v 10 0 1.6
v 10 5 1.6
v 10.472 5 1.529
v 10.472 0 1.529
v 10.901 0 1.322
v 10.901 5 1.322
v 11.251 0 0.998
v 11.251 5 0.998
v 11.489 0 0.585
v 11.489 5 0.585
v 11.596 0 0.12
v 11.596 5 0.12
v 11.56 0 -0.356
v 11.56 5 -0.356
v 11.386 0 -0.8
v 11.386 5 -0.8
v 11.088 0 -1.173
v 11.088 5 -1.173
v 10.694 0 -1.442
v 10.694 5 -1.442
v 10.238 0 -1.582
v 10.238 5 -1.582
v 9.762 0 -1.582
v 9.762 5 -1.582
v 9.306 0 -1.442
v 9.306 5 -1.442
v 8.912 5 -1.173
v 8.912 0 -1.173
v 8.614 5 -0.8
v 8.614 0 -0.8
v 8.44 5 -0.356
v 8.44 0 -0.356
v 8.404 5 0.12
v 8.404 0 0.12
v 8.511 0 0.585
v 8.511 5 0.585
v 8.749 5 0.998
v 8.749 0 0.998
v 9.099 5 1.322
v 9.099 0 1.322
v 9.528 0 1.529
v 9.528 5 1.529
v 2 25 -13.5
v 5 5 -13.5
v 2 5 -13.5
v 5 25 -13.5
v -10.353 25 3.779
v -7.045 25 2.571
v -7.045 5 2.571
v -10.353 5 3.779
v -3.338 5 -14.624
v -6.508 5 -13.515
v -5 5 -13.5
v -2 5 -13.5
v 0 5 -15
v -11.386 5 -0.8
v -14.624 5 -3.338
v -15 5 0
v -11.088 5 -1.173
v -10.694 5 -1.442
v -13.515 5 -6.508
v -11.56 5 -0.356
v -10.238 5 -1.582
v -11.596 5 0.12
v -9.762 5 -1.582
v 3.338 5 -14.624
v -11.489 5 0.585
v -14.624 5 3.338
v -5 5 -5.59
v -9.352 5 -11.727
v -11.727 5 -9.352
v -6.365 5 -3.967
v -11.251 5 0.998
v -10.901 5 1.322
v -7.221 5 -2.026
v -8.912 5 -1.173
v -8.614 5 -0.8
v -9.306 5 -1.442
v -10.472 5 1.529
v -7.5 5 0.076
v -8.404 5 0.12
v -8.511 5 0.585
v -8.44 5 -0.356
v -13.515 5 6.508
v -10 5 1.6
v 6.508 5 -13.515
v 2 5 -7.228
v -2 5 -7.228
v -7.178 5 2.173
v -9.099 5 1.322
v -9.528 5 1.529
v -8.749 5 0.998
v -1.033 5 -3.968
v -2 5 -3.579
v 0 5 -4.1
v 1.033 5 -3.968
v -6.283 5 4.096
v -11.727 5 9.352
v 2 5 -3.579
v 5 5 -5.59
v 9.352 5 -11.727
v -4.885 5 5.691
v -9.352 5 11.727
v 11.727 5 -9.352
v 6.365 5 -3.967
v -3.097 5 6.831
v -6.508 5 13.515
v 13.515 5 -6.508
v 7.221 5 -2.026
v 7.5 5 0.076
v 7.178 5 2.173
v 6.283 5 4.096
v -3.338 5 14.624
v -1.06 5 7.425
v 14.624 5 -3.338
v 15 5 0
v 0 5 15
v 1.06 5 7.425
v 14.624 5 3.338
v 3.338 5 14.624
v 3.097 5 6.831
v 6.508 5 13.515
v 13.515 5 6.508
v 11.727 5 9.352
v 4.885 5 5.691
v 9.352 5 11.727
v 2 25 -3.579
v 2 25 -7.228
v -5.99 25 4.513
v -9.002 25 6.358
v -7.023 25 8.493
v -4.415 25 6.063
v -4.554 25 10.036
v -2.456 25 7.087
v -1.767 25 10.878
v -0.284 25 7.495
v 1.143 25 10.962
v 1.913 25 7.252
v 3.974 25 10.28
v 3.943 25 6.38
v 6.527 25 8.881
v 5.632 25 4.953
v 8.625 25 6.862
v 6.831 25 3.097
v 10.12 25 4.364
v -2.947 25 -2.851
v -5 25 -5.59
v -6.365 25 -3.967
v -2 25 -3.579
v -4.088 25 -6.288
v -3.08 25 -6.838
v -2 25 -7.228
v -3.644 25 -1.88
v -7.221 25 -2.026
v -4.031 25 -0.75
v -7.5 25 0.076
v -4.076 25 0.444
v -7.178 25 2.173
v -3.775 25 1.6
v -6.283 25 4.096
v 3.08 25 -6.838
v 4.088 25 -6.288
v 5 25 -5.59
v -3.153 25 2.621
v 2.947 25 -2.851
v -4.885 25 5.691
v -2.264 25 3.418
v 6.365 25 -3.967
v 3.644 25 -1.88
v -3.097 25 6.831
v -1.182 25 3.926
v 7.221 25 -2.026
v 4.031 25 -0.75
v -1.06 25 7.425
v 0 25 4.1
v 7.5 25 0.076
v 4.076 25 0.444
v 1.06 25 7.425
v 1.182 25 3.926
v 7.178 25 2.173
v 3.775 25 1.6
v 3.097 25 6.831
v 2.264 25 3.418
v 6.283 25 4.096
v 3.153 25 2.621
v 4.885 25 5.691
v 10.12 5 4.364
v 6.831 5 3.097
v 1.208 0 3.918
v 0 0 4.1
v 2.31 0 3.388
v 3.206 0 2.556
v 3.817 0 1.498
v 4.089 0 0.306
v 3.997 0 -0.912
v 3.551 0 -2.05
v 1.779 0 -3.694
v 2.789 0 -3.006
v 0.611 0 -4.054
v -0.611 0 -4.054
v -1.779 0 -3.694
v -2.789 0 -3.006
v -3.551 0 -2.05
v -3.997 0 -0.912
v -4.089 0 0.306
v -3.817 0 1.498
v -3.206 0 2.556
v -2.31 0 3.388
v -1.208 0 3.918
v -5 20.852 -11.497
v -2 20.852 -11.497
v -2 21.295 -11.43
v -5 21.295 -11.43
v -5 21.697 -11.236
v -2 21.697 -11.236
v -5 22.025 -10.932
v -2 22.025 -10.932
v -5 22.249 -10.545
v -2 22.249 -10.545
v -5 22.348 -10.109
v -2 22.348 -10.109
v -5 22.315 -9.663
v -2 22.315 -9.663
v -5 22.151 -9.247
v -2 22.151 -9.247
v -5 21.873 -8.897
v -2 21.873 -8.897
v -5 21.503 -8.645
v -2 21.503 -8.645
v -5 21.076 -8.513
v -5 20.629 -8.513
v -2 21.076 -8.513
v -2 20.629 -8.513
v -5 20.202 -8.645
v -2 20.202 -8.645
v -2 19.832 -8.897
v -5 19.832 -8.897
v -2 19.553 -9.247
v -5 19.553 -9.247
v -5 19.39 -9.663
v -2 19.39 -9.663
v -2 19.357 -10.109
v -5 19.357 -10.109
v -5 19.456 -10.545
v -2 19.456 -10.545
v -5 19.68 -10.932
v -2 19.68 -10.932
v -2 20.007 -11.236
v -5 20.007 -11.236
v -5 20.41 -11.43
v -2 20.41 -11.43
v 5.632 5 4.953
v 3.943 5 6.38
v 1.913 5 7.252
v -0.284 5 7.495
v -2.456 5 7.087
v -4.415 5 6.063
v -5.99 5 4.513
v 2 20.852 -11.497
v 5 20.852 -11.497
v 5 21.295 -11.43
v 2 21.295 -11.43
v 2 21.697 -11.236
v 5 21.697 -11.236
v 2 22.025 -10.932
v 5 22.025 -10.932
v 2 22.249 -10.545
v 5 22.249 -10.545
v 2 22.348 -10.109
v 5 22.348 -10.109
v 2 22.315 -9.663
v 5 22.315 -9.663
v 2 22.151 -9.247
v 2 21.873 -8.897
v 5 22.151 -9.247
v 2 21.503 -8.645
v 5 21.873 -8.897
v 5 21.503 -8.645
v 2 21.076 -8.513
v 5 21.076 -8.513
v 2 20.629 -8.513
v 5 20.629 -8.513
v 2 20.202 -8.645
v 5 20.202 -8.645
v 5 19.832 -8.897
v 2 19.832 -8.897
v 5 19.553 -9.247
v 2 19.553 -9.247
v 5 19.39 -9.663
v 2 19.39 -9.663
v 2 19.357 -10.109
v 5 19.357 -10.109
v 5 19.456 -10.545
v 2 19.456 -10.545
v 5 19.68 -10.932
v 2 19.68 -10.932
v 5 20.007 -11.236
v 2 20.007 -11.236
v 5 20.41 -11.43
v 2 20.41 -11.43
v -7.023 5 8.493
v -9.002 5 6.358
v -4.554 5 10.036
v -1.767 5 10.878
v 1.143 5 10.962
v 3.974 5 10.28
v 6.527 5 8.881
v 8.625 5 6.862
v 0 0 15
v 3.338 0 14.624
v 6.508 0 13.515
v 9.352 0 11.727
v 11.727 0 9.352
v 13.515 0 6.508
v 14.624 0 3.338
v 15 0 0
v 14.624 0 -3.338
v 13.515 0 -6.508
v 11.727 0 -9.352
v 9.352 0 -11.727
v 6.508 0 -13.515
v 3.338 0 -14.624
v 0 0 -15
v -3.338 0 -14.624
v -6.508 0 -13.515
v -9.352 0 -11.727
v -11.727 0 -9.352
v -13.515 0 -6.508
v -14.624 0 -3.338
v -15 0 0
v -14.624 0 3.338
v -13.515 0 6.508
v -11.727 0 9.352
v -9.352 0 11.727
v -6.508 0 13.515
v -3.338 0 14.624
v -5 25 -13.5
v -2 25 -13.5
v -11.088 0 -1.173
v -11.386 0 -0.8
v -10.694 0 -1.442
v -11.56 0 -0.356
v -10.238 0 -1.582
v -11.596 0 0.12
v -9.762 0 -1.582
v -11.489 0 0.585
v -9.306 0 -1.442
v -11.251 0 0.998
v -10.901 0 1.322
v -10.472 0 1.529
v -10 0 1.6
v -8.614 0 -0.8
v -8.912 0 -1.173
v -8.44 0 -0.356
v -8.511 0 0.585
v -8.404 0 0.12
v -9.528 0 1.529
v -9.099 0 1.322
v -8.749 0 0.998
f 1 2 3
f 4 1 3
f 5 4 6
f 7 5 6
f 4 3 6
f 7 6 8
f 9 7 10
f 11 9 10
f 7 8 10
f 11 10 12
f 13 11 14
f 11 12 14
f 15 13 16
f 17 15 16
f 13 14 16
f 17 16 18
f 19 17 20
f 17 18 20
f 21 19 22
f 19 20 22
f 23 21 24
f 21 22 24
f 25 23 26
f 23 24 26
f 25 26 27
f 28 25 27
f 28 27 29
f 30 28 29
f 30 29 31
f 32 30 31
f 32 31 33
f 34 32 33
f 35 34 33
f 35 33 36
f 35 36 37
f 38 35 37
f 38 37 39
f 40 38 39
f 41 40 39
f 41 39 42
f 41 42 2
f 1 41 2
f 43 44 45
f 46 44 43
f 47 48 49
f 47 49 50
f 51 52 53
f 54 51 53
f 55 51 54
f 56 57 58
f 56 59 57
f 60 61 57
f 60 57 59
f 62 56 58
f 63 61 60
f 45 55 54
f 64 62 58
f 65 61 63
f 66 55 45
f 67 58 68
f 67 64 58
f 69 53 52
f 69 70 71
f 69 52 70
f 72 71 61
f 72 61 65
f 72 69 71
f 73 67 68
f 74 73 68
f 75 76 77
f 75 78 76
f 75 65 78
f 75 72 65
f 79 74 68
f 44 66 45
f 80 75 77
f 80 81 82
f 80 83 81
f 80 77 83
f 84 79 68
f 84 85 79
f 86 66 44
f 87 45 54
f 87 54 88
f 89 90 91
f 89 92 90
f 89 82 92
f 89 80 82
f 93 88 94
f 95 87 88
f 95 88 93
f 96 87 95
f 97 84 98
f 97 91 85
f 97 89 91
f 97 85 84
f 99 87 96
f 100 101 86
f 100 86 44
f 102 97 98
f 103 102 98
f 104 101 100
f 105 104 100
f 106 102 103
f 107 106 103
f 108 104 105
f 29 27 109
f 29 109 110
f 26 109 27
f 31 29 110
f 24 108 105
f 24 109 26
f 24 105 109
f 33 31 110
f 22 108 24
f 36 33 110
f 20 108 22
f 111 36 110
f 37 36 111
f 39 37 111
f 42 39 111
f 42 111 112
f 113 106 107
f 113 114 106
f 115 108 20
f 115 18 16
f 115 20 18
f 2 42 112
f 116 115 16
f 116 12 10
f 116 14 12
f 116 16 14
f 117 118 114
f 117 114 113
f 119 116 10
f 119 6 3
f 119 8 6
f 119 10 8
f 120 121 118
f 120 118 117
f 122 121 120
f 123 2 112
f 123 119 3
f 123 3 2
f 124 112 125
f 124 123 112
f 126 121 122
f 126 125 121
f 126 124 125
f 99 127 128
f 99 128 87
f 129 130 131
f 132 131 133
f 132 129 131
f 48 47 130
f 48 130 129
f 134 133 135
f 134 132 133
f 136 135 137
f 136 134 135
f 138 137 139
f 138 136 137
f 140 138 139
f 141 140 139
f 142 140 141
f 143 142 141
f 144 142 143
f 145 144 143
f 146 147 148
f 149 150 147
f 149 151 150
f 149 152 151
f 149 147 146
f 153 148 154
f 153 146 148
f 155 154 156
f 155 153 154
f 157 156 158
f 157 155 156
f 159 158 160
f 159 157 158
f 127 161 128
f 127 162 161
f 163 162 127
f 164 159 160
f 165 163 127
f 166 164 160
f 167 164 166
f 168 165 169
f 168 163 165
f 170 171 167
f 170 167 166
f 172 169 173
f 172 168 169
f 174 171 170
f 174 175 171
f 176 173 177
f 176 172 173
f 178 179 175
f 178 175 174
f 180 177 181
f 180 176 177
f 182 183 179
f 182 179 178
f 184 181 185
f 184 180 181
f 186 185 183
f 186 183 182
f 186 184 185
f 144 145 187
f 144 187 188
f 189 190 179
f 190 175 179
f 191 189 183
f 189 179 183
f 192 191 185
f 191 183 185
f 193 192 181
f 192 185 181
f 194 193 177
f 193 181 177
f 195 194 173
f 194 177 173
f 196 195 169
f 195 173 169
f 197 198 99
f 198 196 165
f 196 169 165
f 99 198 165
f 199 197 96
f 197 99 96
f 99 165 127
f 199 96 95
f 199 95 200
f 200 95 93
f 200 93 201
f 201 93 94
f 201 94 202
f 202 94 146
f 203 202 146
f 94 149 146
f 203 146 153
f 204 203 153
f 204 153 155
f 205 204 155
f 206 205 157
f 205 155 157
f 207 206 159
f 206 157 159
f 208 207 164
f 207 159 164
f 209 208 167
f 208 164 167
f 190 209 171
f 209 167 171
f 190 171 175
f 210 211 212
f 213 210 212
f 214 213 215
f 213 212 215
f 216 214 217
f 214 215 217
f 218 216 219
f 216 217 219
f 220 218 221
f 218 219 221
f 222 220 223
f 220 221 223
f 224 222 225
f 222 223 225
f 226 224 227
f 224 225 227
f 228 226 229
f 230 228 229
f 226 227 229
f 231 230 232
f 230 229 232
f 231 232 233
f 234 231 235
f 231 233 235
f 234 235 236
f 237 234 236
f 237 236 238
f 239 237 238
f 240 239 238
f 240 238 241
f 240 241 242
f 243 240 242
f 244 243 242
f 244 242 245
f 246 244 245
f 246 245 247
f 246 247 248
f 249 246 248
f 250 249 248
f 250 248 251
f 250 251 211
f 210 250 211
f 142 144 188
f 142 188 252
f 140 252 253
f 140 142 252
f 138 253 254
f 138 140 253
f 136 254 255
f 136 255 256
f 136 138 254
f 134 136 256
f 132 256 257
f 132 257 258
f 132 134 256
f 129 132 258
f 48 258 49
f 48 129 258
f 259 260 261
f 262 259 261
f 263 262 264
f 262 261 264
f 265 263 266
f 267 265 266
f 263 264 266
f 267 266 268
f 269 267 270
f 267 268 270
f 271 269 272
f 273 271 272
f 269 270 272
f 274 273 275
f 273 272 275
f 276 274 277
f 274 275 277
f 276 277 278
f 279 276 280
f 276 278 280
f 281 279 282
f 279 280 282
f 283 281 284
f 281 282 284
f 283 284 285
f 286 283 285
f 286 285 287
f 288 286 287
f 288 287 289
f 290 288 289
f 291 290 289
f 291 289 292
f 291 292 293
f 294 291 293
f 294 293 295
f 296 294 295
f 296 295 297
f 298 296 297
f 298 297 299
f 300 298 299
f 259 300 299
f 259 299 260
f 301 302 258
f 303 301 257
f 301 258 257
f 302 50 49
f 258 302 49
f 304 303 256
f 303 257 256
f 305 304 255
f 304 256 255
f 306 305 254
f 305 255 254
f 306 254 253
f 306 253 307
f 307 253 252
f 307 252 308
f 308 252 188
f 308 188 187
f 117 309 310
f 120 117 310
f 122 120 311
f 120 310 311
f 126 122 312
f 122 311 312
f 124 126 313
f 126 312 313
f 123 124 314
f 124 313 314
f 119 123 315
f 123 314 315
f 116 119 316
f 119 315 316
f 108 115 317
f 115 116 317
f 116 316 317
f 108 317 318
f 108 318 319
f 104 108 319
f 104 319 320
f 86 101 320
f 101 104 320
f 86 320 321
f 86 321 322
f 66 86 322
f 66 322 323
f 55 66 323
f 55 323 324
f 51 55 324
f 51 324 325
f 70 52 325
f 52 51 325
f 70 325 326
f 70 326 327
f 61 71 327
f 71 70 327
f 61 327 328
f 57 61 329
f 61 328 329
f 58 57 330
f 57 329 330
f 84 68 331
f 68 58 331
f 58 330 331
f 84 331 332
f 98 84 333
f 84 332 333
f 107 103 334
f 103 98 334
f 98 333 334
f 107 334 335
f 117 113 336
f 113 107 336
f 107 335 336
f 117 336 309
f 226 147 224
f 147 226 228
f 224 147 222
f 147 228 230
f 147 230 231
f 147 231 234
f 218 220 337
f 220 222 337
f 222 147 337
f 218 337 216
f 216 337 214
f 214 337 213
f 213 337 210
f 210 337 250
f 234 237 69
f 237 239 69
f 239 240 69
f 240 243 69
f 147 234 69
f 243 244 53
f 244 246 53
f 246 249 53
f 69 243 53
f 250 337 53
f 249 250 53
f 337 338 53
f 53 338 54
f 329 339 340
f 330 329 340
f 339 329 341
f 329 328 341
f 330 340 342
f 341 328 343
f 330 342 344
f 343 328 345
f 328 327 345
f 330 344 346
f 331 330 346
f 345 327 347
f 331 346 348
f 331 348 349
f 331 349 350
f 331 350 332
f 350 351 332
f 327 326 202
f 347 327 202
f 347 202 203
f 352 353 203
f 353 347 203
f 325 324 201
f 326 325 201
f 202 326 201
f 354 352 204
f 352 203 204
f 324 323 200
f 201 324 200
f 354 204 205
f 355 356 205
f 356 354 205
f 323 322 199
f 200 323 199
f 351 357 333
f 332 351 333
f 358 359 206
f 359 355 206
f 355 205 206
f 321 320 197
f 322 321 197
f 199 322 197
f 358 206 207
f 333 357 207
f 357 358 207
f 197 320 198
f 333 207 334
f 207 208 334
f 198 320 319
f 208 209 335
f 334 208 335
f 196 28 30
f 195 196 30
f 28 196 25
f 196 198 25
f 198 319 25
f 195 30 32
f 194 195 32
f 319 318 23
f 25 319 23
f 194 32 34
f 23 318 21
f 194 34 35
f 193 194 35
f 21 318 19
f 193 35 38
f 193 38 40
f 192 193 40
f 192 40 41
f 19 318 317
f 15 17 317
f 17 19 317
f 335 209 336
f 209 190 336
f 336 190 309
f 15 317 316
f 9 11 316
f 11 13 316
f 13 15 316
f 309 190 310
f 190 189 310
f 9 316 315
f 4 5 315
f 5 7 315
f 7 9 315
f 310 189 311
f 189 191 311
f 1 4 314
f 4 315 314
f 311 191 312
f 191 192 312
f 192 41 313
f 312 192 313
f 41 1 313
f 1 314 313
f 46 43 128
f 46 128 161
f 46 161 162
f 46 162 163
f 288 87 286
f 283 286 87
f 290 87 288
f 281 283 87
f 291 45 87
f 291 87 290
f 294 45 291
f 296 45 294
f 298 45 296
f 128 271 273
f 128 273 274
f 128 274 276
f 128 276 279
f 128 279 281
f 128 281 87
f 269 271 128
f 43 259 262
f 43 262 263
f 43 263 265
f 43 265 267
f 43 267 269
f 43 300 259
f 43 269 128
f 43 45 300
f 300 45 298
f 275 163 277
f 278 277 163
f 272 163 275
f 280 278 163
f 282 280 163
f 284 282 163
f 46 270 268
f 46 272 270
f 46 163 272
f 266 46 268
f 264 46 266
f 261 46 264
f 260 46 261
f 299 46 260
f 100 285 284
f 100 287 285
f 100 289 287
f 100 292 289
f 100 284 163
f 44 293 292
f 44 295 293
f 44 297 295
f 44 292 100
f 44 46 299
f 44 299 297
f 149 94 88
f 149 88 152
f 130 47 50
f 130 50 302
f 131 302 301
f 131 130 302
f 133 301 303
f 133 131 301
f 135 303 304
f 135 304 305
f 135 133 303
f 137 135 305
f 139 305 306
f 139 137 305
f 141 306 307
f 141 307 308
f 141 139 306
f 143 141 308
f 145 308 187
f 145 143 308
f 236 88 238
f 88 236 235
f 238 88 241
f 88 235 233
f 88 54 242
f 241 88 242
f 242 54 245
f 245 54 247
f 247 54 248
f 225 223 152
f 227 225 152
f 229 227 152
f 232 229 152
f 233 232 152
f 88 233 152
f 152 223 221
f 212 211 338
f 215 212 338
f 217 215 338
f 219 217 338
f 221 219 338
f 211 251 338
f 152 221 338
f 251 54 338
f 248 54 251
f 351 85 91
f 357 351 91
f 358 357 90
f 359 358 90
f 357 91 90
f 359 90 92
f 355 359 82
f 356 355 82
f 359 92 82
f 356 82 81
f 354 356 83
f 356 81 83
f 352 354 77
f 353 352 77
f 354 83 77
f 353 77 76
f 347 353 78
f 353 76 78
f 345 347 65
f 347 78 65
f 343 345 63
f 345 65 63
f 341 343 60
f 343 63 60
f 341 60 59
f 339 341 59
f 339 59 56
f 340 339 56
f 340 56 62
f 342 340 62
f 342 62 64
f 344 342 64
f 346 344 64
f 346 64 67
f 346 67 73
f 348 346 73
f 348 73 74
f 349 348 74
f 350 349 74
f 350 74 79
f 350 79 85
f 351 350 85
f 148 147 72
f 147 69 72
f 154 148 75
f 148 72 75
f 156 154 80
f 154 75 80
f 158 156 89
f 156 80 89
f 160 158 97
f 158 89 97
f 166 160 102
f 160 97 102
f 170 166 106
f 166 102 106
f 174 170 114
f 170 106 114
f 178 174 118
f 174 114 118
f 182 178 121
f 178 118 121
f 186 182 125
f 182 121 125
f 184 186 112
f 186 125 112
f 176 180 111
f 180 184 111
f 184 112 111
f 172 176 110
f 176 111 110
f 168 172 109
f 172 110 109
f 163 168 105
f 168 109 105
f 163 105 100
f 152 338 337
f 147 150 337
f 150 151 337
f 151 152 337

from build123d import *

# Parameters (mm, degrees)
SKETCH_1_R           = 15
EXTRUDE_1_DEPTH      = 5
SKETCH_2_R           = 7.5
SKETCH_2_R_2         = 4.1
EXTRUDE_2_DEPTH      = 20
SKETCH_3_R           = 1.6
CUT_EXTRUDE_1_DEPTH  = 30.154759474
SKETCH_4_R           = 4.1
CUT_EXTRUDE_2_DEPTH  = 30.154759474
CUT_EXTRUDE_3_DEPTH  = 20
EXTRUDE_3_DEPTH      = 3
EXTRUDE_3_DEPTH_BACK = 5
SKETCH_8_R           = 1.5
CUT_EXTRUDE_4_DEPTH  = 36.355339059
EXTRUDE_4_DEPTH      = 20


with BuildPart() as part:
    # 草图1 → 凸台-拉伸1 (new body)
    with BuildSketch(Plane(origin=(0, 0, 0), x_dir=(1, 0, 0), z_dir=(0, 1, 0))):
        with Locations(Location((0, 0, 0), (0, 0, 270))):
            Circle(SKETCH_1_R)
    extrude(amount=EXTRUDE_1_DEPTH)

    # 草图2 → 凸台-拉伸2 (add)
    with BuildSketch(Plane(origin=(0, 5, 0), x_dir=(1, 0, 0), z_dir=(0, 1, 0))):
        with Locations(Location((0, 0, 0), (0, 0, 270))):
            Circle(SKETCH_2_R)
        with Locations(Location((0, 0, 0), (0, 0, 270))):
            Circle(SKETCH_2_R_2, mode=Mode.SUBTRACT)
    extrude(amount=EXTRUDE_2_DEPTH)

    # 草图3 → 切除-拉伸1 (cut, through all)
    with BuildSketch(Plane(origin=(0, 5, 0), x_dir=(1, 0, 0), z_dir=(0, 1, 0))):
        with Locations(Location((10, 0, 0), (0, 0, 270))):
            Circle(SKETCH_3_R)
        with Locations(Location((-10, 0, 0), (0, 0, 270))):
            Circle(SKETCH_3_R)
    extrude(amount=-CUT_EXTRUDE_1_DEPTH, mode=Mode.SUBTRACT)

    # 草图4 → 切除-拉伸2 (cut, through all)
    with BuildSketch(Plane(origin=(0, 5, 0), x_dir=(1, 0, 0), z_dir=(0, 1, 0))):
        with Locations(Location((0, 0, 0), (0, 0, 270))):
            Circle(SKETCH_4_R)
    extrude(amount=-CUT_EXTRUDE_2_DEPTH, mode=Mode.SUBTRACT)

    # 草图5 → 切除-拉伸3 (cut)
    with BuildSketch(Plane.XY):
        Polygon((-2, 30), (2, 30), (2, 5), (0, 5), (-2, 5), align=None)
    extrude(amount=-CUT_EXTRUDE_3_DEPTH, mode=Mode.SUBTRACT)

    # Sketch 3D_1 → 凸台-拉伸3 (add, two sides: drawn at the far end of the back side and taken through both)
    with BuildSketch(Plane(origin=(2, 25, -8.5), x_dir=(-0.3165266866074068, -0.9485836055221155, 0), z_dir=(0, 0, 1)).offset(-EXTRUDE_3_DEPTH_BACK)):
        Polygon((0, 0), (-0.94958006, 2.845750817), (18.30285653, 9.26997102), (19.25243659, 6.424220203), align=None)
        Polygon((1.266106746, -3.794334422), (2.215686806, -6.640085239), (22.11503894, 0), (21.165458881, 2.845750817), align=None)
    extrude(amount=EXTRUDE_3_DEPTH + EXTRUDE_3_DEPTH_BACK)

    # 草图8 → 切除-拉伸4 (cut, through all)
    with BuildSketch(Plane(origin=(5, 0, 0), x_dir=(0, 0, -1), z_dir=(1, 0, 0))):
        with Locations((9.996716615, 20.852388533)):
            Circle(SKETCH_8_R)
    extrude(amount=-CUT_EXTRUDE_4_DEPTH, mode=Mode.SUBTRACT)


with BuildPart() as body_2:
    # 草图13 → 凸台-拉伸4 (new body)
    with BuildSketch(Plane(origin=(0, 25, 0), x_dir=(1, 0, 0), z_dir=(0, 1, 0))):
        with BuildLine():
            ThreePointArc((6.830786983, -3.096828893), (-0.283818878, -7.494627866), (-7.045438558, -2.571341193))
            Line((-7.045438558, -2.571341193), (-10.353112879, -3.778527823))
            ThreePointArc((-10.353112879, -3.778527823), (-0.314852007, -11.016582365), (10.120410637, -4.363657563))
            Line((10.120410637, -4.363657563), (6.830786983, -3.096828893))
        make_face()
    extrude(amount=-EXTRUDE_4_DEPTH)


solid = Compound([part.part, body_2.part])
